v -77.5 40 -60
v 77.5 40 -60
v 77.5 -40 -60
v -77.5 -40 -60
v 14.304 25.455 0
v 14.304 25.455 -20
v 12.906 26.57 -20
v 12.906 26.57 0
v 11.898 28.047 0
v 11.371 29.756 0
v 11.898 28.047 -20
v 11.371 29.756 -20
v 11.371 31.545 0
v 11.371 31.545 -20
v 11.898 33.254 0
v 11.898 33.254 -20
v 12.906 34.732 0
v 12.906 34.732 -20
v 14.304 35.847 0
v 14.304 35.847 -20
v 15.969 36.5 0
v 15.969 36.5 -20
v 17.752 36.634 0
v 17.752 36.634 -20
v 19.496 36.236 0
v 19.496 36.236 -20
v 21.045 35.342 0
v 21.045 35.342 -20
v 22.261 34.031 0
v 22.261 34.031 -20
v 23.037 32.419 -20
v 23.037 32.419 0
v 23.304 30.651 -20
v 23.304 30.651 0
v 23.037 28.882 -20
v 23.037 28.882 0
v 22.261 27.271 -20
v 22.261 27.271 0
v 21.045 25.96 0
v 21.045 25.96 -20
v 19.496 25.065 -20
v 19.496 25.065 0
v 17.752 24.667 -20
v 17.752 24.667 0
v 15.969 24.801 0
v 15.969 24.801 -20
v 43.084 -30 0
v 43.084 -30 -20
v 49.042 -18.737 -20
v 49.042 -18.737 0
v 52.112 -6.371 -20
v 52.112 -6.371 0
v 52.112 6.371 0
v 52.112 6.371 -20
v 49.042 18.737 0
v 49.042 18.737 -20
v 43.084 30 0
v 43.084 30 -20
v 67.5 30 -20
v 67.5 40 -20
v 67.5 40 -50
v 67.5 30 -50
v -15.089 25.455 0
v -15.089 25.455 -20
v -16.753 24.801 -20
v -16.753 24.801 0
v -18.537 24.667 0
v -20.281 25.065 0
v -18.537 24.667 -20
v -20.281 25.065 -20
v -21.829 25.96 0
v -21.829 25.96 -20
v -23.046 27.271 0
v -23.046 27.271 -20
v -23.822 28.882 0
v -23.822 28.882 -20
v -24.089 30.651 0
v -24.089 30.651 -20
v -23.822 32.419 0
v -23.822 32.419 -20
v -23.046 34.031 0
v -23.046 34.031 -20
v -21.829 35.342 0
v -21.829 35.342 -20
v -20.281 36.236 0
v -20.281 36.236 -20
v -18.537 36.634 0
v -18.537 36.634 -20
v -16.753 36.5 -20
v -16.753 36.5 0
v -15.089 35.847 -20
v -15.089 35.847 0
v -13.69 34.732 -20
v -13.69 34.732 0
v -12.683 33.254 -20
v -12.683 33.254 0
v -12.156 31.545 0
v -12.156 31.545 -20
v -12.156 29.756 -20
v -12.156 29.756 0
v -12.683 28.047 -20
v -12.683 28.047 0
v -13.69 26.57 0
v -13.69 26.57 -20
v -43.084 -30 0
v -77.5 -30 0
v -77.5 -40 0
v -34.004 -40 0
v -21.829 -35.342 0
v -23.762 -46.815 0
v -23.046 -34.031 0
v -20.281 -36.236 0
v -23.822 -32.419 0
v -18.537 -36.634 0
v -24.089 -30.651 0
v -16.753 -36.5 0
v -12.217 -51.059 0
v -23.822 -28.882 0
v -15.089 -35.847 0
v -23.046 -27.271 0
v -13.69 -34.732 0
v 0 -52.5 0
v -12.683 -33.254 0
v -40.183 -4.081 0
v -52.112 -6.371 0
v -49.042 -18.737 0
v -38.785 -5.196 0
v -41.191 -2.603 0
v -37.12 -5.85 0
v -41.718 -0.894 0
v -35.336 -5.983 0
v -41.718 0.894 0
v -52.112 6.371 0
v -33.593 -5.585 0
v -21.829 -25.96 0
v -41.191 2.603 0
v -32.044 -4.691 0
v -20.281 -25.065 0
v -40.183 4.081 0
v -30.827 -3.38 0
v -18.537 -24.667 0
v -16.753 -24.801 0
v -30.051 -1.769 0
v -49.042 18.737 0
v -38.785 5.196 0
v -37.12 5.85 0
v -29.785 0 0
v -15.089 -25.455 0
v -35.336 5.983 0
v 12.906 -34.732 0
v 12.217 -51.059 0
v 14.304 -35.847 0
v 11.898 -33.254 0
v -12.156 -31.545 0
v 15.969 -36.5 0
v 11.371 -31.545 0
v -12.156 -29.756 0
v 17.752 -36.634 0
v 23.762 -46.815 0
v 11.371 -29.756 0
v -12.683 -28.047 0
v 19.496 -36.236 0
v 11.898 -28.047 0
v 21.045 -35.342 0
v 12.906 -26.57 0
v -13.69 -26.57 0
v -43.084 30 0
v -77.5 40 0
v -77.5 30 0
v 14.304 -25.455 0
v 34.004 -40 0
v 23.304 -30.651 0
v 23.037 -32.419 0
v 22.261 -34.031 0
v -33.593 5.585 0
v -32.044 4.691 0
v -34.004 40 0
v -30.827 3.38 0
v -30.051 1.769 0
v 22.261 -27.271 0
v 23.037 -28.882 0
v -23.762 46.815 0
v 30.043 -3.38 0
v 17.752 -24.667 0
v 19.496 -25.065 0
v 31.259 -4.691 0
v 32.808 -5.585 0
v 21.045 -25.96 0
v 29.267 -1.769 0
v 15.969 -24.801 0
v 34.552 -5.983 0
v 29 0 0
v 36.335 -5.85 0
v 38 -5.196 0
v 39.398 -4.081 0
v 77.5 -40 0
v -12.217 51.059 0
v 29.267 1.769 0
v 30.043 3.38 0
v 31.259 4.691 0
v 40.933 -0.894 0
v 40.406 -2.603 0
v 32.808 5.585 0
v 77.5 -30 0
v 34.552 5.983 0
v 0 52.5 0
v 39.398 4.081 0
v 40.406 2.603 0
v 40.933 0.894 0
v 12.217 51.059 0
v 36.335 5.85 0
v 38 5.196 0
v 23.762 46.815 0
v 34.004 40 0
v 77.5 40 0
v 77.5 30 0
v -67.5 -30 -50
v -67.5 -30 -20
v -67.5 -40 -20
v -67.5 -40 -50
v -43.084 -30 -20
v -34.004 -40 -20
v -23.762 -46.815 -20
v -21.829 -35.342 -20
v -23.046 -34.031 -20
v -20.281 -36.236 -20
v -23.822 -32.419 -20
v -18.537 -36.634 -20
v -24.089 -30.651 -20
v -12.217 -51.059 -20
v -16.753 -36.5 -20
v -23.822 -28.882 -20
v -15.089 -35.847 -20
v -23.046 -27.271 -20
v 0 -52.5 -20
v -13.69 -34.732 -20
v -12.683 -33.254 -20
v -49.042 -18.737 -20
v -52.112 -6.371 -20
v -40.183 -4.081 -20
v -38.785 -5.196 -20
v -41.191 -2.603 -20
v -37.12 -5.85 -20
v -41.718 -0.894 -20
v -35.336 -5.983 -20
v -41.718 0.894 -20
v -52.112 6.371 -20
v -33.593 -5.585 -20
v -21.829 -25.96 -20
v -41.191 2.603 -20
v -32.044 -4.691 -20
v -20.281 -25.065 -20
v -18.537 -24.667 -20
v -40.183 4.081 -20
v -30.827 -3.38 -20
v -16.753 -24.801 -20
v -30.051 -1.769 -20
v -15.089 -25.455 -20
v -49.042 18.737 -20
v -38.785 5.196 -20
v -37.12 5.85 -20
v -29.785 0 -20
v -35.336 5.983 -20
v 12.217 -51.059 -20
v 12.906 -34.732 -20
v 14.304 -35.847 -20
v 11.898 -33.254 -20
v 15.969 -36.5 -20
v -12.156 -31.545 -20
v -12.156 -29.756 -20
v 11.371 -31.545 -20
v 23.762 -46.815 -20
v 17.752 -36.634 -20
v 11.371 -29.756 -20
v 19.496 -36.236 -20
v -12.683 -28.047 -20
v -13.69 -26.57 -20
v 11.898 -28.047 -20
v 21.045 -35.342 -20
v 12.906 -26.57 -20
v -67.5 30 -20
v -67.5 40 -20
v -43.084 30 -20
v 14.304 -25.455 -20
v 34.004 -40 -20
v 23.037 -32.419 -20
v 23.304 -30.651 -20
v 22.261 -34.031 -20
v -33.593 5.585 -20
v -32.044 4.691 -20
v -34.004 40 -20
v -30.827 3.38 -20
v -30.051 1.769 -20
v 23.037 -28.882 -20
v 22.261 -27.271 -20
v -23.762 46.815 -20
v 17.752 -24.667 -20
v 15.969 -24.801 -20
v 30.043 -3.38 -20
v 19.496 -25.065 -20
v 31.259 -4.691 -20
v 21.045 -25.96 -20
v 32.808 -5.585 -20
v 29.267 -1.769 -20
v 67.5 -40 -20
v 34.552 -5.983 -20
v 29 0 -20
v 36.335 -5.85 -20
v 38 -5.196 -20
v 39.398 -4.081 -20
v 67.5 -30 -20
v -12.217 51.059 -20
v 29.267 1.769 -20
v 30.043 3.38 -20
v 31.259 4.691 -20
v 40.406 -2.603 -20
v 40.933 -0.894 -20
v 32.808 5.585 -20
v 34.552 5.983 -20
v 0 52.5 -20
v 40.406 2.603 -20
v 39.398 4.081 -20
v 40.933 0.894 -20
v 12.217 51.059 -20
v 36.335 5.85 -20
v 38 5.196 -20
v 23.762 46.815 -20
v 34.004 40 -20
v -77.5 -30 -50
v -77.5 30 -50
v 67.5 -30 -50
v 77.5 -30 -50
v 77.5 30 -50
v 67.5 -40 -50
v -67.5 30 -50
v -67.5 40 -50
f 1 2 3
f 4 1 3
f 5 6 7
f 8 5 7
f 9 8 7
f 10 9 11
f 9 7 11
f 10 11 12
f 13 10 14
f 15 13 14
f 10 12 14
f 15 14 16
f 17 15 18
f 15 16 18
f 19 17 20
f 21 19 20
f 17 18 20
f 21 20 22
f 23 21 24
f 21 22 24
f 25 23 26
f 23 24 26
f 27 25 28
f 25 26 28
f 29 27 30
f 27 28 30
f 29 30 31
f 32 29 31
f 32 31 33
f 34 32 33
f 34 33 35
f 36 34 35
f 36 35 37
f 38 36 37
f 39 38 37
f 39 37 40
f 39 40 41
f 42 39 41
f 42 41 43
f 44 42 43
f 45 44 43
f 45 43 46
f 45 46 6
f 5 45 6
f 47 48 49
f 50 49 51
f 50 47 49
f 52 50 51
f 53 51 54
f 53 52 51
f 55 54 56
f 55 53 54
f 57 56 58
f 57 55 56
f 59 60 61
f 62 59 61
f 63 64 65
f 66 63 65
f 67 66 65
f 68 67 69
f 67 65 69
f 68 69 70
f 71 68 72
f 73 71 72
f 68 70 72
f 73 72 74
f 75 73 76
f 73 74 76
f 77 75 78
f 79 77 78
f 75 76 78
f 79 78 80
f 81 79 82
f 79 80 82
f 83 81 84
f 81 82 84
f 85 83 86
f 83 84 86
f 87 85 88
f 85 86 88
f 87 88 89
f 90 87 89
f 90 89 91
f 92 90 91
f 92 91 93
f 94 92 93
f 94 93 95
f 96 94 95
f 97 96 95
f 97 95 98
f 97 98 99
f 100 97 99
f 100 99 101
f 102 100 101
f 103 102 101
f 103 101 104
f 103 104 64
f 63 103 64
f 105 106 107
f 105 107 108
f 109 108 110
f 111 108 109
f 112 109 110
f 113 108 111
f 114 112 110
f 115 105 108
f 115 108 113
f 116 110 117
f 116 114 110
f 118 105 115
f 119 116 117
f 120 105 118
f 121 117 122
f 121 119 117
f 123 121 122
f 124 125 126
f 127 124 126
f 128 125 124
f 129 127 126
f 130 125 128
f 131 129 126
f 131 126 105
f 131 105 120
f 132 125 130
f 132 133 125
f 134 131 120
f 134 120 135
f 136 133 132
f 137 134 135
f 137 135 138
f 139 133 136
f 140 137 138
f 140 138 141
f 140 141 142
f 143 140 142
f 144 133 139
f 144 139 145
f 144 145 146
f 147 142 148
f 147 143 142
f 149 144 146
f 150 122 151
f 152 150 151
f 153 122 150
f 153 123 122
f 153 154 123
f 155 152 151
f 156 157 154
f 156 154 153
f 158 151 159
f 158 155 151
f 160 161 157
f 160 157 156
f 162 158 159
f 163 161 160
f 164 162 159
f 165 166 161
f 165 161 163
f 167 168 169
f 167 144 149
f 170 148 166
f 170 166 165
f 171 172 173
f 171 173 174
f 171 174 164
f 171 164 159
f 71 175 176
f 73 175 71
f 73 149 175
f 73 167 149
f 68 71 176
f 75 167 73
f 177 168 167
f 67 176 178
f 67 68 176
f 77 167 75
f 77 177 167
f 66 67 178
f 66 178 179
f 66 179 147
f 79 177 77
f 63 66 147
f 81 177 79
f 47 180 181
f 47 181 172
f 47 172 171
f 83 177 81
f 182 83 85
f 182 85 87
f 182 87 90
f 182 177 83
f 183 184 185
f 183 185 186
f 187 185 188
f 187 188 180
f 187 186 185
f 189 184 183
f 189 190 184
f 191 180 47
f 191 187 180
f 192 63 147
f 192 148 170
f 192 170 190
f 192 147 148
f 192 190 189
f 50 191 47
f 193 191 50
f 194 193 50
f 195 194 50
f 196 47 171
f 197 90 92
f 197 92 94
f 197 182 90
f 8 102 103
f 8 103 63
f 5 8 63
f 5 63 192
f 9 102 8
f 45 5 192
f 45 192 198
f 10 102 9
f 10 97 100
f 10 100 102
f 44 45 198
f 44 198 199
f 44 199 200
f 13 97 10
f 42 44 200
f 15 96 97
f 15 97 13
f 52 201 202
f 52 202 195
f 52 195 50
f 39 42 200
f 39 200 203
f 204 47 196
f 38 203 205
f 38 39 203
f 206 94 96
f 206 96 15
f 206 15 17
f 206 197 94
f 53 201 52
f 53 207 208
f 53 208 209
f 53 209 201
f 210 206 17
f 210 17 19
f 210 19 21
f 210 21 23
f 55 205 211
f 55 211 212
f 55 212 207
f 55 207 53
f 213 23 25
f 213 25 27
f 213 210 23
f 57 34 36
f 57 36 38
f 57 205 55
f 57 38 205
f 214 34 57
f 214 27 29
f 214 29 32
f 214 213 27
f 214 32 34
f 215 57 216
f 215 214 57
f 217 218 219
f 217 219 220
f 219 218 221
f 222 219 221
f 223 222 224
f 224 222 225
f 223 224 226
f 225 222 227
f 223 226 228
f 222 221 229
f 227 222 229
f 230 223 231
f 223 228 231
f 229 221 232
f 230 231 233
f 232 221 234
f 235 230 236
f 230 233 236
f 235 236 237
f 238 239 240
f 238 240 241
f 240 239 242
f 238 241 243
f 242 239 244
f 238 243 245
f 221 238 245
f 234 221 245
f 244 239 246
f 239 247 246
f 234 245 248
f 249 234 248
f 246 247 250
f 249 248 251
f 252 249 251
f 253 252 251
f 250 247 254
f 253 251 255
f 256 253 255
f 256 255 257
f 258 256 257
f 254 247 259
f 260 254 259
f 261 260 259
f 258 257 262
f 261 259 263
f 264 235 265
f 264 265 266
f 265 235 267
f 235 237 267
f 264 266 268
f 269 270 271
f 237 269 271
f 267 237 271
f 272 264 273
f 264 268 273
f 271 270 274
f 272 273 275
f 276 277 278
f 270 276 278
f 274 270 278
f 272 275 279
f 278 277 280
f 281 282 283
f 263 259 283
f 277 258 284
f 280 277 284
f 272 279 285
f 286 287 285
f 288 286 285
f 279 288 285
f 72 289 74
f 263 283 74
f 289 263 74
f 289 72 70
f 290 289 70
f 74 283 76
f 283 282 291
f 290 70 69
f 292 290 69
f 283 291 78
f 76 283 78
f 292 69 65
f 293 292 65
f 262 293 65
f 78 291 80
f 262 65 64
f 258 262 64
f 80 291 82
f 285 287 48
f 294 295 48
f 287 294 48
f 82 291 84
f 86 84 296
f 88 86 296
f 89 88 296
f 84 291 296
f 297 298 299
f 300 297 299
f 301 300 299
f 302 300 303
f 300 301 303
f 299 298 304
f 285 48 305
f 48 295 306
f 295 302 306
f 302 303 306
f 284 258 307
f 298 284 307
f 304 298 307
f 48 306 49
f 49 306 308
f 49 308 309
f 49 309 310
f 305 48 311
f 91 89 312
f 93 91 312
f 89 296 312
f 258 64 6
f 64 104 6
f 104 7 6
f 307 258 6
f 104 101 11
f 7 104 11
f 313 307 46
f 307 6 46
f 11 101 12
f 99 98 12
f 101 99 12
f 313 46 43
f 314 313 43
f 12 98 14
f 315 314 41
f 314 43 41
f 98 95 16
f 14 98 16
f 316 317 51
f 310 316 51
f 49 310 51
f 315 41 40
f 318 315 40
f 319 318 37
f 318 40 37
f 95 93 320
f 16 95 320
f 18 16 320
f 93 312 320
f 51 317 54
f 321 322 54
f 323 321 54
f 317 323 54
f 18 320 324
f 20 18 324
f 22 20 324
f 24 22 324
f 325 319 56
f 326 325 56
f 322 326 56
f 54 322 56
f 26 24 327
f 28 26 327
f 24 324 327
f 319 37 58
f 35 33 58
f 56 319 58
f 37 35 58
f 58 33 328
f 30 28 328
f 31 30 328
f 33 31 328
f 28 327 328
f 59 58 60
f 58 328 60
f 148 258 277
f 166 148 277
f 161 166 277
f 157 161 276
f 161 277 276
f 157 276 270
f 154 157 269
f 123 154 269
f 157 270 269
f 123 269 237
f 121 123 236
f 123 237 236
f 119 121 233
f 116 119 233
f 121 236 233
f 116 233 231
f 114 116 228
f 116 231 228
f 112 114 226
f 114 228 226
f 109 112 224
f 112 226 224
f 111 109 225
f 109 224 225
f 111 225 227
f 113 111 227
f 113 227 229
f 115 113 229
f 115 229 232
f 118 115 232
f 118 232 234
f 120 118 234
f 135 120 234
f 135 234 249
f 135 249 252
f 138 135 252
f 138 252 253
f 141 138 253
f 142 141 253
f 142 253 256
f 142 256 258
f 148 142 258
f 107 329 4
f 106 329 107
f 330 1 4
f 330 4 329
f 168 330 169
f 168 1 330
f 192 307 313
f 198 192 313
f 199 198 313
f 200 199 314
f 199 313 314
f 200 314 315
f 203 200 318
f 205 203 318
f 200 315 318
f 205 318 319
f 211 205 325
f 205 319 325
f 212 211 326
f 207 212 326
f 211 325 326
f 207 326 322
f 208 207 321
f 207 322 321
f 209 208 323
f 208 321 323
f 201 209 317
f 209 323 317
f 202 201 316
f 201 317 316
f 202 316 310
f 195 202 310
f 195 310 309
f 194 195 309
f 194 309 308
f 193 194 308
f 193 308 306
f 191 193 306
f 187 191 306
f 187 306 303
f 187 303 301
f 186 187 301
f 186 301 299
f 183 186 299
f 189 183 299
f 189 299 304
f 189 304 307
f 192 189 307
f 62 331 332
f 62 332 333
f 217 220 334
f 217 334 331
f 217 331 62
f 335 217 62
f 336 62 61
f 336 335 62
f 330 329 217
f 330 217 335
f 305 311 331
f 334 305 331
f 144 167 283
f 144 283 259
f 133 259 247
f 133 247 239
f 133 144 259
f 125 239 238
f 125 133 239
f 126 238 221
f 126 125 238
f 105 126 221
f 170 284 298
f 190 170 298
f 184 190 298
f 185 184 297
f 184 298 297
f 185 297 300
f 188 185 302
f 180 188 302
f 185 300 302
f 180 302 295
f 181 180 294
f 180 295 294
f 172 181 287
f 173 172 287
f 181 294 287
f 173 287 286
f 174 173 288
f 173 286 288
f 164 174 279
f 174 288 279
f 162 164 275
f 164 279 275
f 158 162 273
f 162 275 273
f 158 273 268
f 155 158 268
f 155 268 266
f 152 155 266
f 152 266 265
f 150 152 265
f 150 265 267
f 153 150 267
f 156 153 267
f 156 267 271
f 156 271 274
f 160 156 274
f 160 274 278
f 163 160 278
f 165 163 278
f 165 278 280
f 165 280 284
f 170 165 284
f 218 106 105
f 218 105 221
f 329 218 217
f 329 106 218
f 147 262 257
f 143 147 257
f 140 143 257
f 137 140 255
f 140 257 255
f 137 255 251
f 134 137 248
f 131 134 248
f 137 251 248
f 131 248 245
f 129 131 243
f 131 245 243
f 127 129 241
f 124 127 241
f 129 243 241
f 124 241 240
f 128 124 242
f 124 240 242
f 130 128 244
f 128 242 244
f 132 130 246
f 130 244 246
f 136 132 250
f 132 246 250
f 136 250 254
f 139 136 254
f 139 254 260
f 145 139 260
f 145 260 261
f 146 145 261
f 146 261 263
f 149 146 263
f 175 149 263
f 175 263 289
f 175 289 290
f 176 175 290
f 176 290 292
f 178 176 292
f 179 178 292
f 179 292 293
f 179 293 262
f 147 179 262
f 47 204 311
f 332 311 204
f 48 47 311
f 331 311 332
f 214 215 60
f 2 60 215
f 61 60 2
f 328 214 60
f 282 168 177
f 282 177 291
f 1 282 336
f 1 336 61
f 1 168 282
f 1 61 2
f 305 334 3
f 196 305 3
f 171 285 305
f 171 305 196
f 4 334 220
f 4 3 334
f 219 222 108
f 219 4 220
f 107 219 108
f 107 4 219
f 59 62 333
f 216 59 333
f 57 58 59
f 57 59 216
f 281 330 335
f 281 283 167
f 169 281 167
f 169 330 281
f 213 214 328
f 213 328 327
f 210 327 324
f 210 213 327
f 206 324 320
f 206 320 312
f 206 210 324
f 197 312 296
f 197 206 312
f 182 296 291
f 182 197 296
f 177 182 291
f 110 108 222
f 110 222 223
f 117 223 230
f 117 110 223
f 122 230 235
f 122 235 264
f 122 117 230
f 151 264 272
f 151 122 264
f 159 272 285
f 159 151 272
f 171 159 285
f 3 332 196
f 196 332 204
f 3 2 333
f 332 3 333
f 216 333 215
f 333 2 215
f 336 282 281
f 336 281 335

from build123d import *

# Parameters (mm, degrees)
BOSS_EXTRUDE1_DEPTH      = 77.5
BOSS_EXTRUDE1_DEPTH_BACK = 77.5
SKETCH2_R                = 52.5
BOSS_EXTRUDE2_DEPTH      = 20
SKETCH3_W                = 135
SKETCH3_H                = 30
CUT_EXTRUDE1_DEPTH       = 135.768319719
HOLE1_D                  = 12
HOLE1_DEPTH              = 20
CIRPATTERN1_COUNT        = 6


with BuildPart() as part:
    # Sketch1 → Boss-Extrude1 (new, two sides: drawn at the far end of the back side and taken through both)
    with BuildSketch(Plane(origin=(0, 0, 0), x_dir=(0, 0, -1), z_dir=(1, 0, 0)).offset(-BOSS_EXTRUDE1_DEPTH_BACK)):
        Polygon((0, 40), (60, 40), (60, -40), (0, -40), (0, -30), (50, -30), (50, 30), (0, 30), align=None)
    extrude(amount=BOSS_EXTRUDE1_DEPTH + BOSS_EXTRUDE1_DEPTH_BACK)

    # Sketch2 → Boss-Extrude2 (add)
    with BuildSketch(Plane.XY):
        Circle(SKETCH2_R)
    extrude(amount=-BOSS_EXTRUDE2_DEPTH)

    # Sketch3 → Cut-Extrude1 (cut, through all)
    with BuildSketch(Plane(origin=(0, 40, 0), x_dir=(1, 0, 0), z_dir=(0, 1, 0))):
        with Locations((0, 35)):
            Rectangle(SKETCH3_W, SKETCH3_H)
    extrude(amount=-CUT_EXTRUDE1_DEPTH, mode=Mode.SUBTRACT)

    # Hole1
    with Locations(Plane.XY):
        with Locations((35, 0)):
            hole1 = Hole(HOLE1_D / 2, depth=HOLE1_DEPTH)

    # CirPattern1: Hole1 ×6 about axis
    cirpattern1_axis = Axis((-0.392370816, 0, 0), (0, 0, 1))
    for i in range(1, CIRPATTERN1_COUNT):
        add(hole1.rotate(cirpattern1_axis, i * 360 / CIRPATTERN1_COUNT), mode=Mode.SUBTRACT)


solid = part.part
